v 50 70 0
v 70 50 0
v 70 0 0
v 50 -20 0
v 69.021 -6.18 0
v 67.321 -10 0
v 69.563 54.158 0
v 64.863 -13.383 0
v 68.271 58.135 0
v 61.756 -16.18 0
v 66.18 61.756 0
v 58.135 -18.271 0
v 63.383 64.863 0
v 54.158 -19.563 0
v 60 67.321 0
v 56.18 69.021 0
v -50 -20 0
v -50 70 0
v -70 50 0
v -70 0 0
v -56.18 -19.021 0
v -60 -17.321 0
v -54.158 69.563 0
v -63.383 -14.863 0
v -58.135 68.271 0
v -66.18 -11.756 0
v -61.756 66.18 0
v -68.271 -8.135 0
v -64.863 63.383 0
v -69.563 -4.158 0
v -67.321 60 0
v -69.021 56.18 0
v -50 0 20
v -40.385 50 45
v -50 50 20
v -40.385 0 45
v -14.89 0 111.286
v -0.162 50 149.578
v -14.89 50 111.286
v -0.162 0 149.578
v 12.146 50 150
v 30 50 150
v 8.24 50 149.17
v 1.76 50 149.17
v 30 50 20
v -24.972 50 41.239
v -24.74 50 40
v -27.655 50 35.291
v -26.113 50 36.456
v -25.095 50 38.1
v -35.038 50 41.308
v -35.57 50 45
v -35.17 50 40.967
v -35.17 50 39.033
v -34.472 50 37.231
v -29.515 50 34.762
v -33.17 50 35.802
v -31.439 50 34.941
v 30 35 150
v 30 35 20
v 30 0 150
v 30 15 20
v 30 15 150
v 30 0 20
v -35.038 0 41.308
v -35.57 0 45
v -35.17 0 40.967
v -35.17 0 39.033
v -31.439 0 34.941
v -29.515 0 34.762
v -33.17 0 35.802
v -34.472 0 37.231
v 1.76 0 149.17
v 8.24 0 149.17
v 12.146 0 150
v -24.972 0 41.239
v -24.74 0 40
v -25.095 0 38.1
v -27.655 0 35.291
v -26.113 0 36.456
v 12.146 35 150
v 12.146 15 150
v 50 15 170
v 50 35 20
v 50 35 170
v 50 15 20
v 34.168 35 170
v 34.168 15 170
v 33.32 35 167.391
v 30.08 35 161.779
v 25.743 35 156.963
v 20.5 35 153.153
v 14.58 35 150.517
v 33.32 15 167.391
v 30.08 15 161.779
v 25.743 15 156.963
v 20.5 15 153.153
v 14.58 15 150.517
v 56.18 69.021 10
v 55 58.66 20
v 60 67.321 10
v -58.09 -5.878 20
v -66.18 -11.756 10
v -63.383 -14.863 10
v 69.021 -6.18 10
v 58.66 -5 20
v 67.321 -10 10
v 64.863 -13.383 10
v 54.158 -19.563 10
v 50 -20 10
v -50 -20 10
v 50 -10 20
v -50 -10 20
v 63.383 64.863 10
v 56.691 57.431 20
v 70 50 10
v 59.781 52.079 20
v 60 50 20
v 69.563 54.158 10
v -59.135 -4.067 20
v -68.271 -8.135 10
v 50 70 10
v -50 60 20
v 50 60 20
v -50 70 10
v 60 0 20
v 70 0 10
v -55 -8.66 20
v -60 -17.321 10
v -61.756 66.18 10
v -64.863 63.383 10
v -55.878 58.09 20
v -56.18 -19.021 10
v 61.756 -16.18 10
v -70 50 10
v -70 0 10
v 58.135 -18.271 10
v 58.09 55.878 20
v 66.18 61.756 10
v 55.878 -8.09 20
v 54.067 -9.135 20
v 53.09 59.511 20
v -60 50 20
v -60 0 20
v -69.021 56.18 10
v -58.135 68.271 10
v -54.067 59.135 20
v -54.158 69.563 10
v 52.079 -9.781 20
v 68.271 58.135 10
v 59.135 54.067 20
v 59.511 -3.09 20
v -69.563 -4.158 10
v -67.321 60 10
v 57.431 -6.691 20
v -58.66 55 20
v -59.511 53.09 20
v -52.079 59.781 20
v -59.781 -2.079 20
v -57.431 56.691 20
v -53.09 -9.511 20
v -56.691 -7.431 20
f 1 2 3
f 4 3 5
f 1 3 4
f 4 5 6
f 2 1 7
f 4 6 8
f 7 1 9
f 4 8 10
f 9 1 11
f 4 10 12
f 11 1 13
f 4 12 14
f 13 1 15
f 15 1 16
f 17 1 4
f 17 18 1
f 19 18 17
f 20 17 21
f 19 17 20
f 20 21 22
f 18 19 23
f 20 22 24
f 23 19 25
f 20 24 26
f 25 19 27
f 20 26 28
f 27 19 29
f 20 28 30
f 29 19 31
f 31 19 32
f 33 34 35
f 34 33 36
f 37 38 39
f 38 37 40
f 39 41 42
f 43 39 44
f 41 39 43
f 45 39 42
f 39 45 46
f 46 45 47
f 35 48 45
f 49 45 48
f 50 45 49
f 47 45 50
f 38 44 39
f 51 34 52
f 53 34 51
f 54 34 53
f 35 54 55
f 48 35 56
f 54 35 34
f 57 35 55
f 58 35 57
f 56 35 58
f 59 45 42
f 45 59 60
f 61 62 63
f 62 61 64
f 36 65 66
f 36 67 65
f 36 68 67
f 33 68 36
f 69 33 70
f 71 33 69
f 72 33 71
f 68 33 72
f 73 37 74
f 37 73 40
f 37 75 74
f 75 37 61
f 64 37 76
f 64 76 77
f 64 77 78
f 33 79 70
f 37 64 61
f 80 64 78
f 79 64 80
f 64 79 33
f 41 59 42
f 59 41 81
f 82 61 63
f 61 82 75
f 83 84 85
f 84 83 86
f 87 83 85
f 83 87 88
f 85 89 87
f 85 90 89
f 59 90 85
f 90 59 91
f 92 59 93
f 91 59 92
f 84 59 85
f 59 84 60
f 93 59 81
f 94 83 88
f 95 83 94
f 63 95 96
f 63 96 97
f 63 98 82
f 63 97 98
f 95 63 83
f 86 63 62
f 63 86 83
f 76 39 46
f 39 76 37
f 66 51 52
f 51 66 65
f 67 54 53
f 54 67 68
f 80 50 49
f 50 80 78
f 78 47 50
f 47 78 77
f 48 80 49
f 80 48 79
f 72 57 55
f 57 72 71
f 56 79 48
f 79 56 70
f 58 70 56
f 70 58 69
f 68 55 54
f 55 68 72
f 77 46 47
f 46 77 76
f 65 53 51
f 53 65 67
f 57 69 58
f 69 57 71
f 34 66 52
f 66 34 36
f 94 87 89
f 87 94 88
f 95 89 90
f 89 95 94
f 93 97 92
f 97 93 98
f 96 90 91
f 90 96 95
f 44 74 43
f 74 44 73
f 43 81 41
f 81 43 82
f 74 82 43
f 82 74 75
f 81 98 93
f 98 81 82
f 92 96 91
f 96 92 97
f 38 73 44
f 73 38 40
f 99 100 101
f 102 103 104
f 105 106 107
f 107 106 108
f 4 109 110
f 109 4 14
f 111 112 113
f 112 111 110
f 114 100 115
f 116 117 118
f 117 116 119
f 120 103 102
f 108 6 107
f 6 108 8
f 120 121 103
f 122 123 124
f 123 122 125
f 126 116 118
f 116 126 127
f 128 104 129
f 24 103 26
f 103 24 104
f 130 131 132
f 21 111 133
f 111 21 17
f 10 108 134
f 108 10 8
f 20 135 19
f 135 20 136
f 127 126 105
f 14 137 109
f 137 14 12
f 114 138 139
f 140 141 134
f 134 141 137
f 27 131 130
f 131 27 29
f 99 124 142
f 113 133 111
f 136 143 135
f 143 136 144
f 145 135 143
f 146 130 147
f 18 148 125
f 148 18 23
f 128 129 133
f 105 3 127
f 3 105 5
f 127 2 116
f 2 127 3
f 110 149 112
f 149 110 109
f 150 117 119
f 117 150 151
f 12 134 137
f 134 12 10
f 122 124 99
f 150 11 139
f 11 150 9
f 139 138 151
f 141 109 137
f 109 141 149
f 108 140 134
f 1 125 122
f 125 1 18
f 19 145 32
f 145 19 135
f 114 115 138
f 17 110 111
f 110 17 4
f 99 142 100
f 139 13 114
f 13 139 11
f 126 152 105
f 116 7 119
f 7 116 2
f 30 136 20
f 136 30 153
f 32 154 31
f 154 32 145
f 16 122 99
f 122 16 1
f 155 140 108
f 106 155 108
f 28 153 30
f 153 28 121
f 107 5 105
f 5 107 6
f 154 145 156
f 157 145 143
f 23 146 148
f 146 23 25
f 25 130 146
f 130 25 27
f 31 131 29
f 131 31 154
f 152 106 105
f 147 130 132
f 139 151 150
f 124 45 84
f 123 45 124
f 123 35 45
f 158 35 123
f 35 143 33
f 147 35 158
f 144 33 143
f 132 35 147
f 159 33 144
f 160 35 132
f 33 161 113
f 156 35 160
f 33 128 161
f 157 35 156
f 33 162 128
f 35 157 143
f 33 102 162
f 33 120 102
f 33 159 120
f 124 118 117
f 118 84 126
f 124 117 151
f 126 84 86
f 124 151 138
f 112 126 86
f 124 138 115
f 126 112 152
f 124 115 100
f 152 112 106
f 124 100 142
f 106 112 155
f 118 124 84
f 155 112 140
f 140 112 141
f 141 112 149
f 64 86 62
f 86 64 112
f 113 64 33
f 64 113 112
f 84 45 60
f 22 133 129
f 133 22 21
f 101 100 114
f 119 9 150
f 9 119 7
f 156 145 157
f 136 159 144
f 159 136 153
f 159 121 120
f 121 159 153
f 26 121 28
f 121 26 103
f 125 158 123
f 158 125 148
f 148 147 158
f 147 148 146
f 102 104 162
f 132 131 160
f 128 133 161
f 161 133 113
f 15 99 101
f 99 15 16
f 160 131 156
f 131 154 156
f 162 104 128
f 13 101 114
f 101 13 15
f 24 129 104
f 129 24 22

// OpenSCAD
difference(){
    union(){
        hull(){
        cube([30,50,110+40]);
      translate([-50,0,0])  cube([70,50,20]);
        }
        
        
translate([0,15,0])cube([50,20,110+60]);
        
        
    }
    hull(){
translate([-30,-1,40])rotate([-90,0,0])cylinder(55,4.85,4.85);  
translate([-55,-1,180])  cube([50,50,20]);
    }
    translate([-30,-1,40])rotate([-90,0,0])cylinder(55,5.26,5.26);  

 translate([-75,-2,45])  cube([50,55,20]);

translate([5,0,180])rotate([-90,0,0])cylinder(50,31,31);
    
    
}

hull(){
    linear_extrude(10)    offset(20) translate([-50,0])  square([100,50]);
 linear_extrude(20)    offset(10) translate([-50,0])  square([100,50]);
}
